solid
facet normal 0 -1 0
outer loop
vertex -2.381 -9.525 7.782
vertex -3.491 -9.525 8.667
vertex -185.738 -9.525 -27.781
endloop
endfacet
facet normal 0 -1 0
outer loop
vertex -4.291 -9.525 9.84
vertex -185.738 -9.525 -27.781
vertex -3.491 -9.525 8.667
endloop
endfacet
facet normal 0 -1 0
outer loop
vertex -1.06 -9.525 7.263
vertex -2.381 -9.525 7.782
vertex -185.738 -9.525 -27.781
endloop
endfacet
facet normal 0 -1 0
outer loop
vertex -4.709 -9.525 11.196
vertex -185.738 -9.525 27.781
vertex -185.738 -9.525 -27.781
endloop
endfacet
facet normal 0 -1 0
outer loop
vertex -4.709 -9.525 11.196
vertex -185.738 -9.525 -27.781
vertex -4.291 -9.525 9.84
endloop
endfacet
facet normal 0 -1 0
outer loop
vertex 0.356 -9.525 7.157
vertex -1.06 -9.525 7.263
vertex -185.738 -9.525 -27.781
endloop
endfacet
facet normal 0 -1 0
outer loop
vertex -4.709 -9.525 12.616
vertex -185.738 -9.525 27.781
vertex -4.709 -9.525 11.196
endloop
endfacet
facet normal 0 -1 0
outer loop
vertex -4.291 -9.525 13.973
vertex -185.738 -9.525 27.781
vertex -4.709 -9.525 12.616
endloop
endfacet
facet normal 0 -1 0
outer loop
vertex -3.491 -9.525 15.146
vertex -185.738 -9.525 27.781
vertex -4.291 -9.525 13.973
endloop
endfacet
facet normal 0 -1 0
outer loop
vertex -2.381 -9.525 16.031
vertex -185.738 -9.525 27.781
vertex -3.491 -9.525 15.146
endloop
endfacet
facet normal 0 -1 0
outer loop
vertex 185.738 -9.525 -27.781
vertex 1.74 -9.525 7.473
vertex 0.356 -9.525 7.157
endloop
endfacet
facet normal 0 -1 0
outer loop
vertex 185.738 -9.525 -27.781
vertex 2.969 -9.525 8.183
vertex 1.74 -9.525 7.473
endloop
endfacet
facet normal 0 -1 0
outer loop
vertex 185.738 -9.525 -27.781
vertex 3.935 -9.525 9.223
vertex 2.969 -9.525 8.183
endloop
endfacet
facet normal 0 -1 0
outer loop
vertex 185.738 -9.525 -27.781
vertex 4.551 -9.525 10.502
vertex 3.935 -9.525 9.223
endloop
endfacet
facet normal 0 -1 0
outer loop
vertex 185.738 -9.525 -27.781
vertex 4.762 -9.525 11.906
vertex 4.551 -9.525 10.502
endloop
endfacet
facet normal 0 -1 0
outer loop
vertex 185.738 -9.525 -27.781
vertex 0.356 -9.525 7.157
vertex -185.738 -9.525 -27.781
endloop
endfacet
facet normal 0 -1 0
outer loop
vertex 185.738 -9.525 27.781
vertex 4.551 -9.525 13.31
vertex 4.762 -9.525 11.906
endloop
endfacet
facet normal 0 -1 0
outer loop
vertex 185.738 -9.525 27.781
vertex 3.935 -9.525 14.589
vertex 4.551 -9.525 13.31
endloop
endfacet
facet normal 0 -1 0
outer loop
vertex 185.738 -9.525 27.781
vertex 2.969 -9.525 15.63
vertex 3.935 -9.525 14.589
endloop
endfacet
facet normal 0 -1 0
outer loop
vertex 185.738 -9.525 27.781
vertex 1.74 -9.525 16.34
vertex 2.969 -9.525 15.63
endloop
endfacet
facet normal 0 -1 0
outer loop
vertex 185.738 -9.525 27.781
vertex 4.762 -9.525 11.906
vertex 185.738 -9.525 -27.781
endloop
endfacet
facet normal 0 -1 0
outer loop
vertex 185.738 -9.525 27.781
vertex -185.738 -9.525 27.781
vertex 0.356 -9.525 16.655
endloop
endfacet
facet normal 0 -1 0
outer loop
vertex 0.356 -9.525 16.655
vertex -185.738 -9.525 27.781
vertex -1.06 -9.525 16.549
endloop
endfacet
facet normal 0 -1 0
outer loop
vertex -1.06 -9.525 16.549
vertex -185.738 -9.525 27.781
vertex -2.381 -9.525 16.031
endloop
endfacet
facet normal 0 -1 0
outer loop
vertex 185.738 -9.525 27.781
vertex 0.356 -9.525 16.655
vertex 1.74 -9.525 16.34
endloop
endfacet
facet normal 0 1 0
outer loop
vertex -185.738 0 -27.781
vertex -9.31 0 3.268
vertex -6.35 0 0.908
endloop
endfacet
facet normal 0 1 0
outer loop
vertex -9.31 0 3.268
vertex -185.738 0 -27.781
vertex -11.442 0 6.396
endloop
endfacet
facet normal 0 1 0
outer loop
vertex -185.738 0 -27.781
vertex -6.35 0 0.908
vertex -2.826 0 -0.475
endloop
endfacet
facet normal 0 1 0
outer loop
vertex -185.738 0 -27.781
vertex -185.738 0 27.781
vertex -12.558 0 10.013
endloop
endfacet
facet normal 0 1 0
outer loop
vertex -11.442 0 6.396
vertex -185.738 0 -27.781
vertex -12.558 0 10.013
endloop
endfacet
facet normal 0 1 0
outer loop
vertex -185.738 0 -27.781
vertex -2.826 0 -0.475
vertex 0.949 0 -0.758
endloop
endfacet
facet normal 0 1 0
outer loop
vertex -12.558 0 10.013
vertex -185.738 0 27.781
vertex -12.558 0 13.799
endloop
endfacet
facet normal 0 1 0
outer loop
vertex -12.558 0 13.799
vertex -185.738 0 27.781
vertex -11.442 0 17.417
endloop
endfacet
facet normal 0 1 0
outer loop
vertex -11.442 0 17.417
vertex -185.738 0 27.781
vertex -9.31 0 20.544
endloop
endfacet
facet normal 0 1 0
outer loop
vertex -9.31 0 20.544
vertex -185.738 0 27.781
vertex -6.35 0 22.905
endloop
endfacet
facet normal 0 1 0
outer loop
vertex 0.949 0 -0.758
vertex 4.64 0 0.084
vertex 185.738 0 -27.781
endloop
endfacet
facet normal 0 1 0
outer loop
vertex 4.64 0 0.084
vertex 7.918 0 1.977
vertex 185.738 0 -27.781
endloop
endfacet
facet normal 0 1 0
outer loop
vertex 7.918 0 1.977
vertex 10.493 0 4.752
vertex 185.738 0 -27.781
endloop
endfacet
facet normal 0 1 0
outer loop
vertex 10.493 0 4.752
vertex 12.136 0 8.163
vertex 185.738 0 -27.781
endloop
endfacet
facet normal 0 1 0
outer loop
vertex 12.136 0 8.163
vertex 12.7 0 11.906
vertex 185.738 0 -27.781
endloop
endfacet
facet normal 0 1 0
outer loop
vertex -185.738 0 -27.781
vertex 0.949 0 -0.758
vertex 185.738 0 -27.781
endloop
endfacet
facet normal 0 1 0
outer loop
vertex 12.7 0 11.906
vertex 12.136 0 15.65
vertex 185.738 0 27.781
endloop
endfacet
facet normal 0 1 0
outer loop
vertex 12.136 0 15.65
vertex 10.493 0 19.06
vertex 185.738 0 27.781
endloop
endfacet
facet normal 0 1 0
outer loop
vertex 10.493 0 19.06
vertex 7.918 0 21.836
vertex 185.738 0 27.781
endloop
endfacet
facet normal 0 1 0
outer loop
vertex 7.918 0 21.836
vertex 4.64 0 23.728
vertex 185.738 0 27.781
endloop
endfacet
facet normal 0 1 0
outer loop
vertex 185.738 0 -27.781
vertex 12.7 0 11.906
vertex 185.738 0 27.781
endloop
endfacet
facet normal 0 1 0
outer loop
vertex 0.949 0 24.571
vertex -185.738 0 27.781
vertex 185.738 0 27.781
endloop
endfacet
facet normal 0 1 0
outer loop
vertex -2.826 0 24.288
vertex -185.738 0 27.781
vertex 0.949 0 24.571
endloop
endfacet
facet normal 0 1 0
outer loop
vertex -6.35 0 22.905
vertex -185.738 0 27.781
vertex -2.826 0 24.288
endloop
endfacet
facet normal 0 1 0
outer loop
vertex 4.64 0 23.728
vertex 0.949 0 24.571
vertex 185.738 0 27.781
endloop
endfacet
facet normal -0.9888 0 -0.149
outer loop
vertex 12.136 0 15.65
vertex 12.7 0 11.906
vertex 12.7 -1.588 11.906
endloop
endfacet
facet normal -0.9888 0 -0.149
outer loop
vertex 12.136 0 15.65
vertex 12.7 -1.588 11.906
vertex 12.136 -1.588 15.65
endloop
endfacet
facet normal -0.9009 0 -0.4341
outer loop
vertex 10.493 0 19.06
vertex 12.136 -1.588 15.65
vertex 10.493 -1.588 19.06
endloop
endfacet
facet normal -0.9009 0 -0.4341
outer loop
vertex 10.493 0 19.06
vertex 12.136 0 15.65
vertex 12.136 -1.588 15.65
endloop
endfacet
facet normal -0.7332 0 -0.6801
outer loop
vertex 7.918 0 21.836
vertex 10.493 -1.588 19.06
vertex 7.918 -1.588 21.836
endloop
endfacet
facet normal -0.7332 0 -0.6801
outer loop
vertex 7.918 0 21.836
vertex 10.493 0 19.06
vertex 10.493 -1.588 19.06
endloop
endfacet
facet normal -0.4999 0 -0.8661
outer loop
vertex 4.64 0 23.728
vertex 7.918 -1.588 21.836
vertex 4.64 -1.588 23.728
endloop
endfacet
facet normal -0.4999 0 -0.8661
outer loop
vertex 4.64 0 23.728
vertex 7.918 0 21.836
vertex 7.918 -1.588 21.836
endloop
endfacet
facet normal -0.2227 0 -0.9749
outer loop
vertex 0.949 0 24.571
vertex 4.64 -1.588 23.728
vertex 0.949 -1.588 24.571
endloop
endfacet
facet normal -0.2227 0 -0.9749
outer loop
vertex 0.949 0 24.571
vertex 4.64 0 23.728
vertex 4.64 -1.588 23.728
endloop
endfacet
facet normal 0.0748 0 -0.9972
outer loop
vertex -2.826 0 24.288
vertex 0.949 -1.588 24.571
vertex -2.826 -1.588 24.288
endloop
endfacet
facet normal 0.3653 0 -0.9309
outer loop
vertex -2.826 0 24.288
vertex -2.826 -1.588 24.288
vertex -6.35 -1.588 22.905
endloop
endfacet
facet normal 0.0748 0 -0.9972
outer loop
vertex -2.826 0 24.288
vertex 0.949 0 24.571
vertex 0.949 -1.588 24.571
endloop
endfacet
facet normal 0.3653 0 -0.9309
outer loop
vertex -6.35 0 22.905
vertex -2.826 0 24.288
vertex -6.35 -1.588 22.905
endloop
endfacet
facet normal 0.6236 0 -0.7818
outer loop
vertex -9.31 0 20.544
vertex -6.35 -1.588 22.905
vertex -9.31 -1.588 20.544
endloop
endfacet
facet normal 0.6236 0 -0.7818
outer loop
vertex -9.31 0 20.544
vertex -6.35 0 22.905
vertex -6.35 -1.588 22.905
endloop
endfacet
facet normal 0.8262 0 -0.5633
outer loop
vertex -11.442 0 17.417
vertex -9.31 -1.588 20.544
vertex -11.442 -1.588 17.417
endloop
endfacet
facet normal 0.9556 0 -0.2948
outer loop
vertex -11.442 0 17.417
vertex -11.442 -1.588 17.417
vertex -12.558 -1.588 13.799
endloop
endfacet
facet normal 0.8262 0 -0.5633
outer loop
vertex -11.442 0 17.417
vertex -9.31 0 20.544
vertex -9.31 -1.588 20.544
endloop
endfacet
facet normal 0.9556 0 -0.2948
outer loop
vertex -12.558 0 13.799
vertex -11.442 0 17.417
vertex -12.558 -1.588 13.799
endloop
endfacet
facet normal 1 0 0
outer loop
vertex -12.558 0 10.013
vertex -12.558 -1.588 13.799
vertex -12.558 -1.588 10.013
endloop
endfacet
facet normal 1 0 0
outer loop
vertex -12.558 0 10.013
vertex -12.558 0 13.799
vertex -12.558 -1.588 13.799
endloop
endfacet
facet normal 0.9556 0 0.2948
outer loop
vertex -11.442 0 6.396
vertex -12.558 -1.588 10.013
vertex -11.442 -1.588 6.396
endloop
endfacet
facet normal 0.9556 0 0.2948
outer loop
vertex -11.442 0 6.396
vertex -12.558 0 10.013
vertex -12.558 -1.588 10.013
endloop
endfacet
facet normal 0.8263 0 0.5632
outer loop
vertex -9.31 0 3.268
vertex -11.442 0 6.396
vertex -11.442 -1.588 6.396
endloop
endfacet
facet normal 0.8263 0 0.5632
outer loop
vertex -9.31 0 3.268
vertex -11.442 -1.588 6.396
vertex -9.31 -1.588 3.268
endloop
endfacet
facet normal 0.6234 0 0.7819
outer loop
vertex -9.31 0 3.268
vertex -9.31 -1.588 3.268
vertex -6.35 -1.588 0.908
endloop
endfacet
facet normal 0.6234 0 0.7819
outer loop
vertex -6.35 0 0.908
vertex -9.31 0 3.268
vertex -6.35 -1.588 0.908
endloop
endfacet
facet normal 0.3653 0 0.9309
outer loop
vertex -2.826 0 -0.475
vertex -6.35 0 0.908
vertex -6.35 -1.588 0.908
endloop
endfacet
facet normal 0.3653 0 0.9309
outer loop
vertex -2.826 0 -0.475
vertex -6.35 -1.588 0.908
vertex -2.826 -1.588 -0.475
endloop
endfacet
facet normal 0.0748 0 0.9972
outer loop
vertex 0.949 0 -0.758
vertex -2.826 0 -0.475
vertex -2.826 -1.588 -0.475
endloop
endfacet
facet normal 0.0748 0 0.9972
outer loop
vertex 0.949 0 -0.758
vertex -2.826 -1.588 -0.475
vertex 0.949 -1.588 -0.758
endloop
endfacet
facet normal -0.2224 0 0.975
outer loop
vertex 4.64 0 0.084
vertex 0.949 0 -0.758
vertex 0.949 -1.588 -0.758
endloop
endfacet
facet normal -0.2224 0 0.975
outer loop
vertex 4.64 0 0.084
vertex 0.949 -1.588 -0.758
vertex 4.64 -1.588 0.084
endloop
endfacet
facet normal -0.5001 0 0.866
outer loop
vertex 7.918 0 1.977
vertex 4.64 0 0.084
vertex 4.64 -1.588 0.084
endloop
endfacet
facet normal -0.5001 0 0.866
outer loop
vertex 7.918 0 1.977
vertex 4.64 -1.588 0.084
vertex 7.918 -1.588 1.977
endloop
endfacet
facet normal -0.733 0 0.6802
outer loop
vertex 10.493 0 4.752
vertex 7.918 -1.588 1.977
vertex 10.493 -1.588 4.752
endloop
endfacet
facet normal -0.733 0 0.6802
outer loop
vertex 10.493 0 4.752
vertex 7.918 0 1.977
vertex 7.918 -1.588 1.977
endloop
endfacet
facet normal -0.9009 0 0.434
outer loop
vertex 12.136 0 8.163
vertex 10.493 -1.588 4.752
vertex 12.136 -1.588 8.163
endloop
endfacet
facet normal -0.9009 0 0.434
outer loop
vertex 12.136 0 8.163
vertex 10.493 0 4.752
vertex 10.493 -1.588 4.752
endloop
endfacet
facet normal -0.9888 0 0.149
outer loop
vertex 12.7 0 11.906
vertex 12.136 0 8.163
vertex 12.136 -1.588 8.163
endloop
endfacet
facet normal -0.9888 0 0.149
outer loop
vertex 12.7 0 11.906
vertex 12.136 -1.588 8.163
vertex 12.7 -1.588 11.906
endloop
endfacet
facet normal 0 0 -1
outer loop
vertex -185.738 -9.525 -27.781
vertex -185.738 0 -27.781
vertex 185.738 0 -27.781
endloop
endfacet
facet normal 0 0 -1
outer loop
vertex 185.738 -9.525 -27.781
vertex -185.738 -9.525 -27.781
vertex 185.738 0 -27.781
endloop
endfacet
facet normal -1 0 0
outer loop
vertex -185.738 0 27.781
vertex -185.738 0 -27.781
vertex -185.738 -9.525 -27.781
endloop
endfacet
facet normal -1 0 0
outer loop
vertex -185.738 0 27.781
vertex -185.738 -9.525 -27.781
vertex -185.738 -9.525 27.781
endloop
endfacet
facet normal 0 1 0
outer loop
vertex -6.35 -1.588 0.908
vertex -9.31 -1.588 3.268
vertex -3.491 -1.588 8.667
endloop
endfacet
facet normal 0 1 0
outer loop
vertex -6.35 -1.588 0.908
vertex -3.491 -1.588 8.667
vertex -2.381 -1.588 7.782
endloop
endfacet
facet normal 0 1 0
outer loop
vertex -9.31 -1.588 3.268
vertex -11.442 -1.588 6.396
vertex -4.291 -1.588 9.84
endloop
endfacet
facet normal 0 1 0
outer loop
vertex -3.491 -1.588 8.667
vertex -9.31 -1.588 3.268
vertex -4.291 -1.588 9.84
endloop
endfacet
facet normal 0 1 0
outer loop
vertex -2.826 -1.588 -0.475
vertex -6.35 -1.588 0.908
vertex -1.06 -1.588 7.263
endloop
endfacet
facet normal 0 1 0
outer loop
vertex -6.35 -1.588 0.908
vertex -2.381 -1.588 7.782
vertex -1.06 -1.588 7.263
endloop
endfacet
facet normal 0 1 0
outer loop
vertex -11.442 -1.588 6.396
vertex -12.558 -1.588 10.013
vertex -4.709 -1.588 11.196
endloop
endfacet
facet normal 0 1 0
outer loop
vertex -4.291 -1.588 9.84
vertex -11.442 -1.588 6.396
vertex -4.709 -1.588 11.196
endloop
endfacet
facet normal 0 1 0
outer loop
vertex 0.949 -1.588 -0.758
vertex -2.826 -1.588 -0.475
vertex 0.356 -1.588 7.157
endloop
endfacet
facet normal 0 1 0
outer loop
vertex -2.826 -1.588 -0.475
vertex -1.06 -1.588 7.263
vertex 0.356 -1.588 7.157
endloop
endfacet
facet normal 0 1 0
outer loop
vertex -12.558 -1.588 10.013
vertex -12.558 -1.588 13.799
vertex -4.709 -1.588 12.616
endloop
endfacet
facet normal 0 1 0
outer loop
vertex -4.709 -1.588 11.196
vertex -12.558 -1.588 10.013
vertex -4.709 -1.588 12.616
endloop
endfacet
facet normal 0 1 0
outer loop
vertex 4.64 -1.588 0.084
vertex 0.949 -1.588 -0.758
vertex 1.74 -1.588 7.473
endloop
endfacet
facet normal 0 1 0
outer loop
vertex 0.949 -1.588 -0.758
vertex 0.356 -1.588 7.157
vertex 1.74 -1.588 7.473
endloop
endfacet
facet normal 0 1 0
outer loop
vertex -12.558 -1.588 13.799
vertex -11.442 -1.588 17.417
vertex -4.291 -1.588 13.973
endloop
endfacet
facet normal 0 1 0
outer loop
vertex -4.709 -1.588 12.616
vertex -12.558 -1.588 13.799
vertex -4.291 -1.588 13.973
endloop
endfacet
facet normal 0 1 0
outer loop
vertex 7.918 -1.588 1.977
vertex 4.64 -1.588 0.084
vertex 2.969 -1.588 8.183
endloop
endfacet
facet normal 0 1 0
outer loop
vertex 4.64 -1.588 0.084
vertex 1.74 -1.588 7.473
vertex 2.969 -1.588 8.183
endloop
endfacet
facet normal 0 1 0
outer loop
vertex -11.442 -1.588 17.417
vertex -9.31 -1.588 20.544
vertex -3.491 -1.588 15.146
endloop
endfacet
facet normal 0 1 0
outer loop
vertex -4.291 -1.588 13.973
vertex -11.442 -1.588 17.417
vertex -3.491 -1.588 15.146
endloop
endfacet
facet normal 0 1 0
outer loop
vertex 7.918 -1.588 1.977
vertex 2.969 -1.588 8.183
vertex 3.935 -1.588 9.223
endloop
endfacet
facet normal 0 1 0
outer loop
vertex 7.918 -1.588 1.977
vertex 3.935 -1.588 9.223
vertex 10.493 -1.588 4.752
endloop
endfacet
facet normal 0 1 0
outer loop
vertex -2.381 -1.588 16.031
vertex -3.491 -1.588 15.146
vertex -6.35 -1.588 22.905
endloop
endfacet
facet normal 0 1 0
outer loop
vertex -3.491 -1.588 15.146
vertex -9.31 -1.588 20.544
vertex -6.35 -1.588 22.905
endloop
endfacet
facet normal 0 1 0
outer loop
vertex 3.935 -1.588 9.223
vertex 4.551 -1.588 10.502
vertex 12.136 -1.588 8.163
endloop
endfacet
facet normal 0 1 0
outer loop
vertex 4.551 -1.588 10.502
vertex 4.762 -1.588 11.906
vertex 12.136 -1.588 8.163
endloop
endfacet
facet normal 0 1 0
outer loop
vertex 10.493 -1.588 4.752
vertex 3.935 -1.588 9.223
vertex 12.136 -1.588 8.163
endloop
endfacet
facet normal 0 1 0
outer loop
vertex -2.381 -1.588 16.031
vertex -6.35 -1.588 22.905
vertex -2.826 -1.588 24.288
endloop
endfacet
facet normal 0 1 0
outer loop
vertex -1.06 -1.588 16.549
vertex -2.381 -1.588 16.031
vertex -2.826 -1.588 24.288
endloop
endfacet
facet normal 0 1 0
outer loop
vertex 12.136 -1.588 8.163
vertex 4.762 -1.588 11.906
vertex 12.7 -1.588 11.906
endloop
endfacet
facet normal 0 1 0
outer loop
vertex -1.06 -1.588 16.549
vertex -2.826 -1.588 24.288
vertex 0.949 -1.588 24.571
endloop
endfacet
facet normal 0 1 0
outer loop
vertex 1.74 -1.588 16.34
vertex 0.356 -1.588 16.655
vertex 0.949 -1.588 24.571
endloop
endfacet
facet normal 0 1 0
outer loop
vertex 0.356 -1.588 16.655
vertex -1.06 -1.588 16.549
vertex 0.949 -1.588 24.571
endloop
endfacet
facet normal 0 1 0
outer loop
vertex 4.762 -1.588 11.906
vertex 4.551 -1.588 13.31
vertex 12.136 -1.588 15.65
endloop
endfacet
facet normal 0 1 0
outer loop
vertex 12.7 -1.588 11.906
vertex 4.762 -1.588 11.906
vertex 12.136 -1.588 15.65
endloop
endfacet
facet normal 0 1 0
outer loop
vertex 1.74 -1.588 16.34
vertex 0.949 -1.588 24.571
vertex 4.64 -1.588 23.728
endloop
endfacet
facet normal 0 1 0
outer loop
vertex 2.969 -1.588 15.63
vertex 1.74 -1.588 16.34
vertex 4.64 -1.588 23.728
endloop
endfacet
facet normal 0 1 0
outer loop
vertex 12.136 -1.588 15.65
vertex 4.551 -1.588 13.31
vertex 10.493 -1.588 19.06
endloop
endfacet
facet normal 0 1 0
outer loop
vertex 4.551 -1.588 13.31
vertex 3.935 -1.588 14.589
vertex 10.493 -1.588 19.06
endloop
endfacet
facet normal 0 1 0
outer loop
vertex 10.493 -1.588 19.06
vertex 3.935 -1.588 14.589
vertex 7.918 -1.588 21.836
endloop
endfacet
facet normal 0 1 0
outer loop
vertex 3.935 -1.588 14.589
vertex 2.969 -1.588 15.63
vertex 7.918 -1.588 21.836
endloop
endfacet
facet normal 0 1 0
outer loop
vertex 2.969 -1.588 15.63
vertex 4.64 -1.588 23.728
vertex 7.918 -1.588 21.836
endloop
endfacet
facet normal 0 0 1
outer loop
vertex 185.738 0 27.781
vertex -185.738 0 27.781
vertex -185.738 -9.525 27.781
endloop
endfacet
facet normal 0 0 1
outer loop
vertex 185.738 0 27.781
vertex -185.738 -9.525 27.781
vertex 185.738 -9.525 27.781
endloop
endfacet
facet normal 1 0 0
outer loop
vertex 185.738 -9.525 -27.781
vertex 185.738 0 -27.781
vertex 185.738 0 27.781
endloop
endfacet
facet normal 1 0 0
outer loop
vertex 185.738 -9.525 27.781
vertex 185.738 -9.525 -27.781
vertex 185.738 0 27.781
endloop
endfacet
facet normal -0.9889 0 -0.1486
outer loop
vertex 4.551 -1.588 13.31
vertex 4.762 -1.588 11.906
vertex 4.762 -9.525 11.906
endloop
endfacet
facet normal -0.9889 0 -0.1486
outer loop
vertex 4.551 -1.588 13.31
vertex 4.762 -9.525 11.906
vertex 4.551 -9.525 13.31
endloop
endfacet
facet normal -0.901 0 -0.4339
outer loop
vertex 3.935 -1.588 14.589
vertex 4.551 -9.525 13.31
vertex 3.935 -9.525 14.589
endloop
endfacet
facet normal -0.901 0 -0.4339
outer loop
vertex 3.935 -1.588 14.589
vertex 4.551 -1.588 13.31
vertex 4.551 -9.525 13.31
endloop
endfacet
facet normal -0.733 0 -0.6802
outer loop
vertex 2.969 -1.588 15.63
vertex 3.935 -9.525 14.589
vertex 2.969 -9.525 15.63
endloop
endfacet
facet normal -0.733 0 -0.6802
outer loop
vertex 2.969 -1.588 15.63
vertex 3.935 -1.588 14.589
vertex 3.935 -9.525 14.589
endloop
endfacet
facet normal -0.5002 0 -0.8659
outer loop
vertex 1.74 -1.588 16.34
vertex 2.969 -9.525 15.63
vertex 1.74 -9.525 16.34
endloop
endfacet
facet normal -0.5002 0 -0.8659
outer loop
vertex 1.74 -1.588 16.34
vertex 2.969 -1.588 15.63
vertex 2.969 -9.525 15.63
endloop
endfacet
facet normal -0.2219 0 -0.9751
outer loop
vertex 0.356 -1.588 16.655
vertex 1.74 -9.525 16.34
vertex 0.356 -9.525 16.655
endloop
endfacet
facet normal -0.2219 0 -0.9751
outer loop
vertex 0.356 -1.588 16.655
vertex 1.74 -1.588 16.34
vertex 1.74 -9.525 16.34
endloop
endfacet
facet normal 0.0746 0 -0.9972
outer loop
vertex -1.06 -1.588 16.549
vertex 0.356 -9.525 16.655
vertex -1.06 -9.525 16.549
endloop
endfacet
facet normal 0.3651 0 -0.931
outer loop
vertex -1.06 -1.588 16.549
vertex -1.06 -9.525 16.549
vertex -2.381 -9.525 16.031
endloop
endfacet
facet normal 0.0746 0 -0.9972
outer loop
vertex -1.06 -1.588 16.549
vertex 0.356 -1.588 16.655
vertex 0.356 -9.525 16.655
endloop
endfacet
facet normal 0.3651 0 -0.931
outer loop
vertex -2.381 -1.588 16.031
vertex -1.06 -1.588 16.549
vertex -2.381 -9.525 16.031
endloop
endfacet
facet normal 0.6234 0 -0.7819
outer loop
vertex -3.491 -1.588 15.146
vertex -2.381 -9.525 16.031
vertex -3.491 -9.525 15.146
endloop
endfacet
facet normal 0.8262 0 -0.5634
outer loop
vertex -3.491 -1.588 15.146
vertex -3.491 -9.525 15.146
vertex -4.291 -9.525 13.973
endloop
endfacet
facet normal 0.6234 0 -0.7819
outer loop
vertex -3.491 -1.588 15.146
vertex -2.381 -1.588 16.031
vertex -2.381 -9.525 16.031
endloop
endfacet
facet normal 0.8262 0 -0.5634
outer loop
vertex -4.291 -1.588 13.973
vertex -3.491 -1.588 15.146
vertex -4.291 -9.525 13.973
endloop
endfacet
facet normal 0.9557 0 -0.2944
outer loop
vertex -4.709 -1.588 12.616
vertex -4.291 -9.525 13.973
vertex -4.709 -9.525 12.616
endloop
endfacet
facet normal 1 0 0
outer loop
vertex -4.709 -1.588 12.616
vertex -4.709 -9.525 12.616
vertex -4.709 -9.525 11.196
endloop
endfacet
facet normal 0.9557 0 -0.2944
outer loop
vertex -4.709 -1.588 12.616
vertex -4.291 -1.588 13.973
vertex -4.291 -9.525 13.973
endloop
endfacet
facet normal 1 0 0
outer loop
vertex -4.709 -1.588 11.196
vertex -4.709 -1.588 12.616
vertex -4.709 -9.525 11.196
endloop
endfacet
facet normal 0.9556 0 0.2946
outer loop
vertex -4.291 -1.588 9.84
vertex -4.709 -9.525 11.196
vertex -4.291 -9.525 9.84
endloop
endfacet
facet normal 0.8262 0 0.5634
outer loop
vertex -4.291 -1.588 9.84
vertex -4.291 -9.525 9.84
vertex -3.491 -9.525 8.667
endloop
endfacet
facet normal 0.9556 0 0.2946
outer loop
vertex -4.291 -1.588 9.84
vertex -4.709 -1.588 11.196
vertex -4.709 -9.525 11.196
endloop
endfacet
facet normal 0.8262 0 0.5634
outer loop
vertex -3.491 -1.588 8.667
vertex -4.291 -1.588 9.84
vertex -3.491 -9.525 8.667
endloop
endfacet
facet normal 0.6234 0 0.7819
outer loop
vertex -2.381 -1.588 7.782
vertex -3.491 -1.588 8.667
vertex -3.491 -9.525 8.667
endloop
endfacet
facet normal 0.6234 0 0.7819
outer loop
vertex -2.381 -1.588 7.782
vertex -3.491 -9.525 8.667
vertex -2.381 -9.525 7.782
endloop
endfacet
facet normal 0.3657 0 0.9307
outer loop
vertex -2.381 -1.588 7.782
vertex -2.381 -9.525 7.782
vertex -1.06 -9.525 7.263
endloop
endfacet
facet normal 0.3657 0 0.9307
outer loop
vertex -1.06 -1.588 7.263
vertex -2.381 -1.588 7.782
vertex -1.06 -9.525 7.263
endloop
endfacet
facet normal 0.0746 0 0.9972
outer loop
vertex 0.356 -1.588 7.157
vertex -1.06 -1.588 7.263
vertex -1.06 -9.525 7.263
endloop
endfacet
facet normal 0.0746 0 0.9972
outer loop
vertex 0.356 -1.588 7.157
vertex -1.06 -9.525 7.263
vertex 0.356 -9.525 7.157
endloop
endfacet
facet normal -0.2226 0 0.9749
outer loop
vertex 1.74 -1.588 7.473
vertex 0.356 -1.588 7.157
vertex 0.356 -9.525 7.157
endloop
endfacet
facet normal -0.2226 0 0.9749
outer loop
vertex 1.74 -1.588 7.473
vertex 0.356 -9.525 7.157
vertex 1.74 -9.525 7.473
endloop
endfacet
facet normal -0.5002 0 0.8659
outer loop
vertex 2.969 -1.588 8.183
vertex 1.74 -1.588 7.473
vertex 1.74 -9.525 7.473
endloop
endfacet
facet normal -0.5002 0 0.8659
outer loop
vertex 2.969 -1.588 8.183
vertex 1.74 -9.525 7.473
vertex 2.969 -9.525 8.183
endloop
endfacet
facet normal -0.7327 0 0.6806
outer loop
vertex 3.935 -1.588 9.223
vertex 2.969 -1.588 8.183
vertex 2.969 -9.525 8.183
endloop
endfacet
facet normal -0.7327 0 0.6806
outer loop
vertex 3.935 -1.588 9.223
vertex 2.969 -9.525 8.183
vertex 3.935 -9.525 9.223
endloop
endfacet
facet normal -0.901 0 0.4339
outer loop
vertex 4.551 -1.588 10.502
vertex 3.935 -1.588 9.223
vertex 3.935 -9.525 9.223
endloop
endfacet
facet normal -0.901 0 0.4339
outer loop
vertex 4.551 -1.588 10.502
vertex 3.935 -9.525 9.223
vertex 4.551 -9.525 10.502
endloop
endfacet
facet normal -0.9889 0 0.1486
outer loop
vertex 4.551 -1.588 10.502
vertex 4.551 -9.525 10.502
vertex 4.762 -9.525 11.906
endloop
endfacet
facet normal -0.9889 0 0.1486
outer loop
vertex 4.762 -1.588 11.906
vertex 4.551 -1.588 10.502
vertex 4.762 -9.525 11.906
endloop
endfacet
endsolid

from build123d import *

# Parameters (mm, degrees)
F0_W     = 371.475
F0_H     = 55.5625
F0_R     = 12.7
F0_R_2   = 4.7625
F1_DEPTH = 9.525
F2_DEPTH = 1.5875


with BuildPart() as f1:
    # F0 (on Front) → F1 (new body)
    with BuildSketch(Plane.XZ):
        Rectangle(F0_W, F0_H)
        with Locations((0, 11.90625)):
            Circle(F0_R, mode=Mode.SUBTRACT)
        with Locations((0, 11.90625)):
            Circle(F0_R)
        with Locations((0, 11.90625)):
            Circle(F0_R_2, mode=Mode.SUBTRACT)
    extrude(amount=F1_DEPTH)

    # F0 (on Front) → F2 (cut)
    with BuildSketch(Plane.XZ):
        with Locations((0, 11.90625)):
            Circle(F0_R)
        with Locations((0, 11.90625)):
            Circle(F0_R_2, mode=Mode.SUBTRACT)
    extrude(amount=F2_DEPTH, mode=Mode.SUBTRACT)


solid = f1.part
